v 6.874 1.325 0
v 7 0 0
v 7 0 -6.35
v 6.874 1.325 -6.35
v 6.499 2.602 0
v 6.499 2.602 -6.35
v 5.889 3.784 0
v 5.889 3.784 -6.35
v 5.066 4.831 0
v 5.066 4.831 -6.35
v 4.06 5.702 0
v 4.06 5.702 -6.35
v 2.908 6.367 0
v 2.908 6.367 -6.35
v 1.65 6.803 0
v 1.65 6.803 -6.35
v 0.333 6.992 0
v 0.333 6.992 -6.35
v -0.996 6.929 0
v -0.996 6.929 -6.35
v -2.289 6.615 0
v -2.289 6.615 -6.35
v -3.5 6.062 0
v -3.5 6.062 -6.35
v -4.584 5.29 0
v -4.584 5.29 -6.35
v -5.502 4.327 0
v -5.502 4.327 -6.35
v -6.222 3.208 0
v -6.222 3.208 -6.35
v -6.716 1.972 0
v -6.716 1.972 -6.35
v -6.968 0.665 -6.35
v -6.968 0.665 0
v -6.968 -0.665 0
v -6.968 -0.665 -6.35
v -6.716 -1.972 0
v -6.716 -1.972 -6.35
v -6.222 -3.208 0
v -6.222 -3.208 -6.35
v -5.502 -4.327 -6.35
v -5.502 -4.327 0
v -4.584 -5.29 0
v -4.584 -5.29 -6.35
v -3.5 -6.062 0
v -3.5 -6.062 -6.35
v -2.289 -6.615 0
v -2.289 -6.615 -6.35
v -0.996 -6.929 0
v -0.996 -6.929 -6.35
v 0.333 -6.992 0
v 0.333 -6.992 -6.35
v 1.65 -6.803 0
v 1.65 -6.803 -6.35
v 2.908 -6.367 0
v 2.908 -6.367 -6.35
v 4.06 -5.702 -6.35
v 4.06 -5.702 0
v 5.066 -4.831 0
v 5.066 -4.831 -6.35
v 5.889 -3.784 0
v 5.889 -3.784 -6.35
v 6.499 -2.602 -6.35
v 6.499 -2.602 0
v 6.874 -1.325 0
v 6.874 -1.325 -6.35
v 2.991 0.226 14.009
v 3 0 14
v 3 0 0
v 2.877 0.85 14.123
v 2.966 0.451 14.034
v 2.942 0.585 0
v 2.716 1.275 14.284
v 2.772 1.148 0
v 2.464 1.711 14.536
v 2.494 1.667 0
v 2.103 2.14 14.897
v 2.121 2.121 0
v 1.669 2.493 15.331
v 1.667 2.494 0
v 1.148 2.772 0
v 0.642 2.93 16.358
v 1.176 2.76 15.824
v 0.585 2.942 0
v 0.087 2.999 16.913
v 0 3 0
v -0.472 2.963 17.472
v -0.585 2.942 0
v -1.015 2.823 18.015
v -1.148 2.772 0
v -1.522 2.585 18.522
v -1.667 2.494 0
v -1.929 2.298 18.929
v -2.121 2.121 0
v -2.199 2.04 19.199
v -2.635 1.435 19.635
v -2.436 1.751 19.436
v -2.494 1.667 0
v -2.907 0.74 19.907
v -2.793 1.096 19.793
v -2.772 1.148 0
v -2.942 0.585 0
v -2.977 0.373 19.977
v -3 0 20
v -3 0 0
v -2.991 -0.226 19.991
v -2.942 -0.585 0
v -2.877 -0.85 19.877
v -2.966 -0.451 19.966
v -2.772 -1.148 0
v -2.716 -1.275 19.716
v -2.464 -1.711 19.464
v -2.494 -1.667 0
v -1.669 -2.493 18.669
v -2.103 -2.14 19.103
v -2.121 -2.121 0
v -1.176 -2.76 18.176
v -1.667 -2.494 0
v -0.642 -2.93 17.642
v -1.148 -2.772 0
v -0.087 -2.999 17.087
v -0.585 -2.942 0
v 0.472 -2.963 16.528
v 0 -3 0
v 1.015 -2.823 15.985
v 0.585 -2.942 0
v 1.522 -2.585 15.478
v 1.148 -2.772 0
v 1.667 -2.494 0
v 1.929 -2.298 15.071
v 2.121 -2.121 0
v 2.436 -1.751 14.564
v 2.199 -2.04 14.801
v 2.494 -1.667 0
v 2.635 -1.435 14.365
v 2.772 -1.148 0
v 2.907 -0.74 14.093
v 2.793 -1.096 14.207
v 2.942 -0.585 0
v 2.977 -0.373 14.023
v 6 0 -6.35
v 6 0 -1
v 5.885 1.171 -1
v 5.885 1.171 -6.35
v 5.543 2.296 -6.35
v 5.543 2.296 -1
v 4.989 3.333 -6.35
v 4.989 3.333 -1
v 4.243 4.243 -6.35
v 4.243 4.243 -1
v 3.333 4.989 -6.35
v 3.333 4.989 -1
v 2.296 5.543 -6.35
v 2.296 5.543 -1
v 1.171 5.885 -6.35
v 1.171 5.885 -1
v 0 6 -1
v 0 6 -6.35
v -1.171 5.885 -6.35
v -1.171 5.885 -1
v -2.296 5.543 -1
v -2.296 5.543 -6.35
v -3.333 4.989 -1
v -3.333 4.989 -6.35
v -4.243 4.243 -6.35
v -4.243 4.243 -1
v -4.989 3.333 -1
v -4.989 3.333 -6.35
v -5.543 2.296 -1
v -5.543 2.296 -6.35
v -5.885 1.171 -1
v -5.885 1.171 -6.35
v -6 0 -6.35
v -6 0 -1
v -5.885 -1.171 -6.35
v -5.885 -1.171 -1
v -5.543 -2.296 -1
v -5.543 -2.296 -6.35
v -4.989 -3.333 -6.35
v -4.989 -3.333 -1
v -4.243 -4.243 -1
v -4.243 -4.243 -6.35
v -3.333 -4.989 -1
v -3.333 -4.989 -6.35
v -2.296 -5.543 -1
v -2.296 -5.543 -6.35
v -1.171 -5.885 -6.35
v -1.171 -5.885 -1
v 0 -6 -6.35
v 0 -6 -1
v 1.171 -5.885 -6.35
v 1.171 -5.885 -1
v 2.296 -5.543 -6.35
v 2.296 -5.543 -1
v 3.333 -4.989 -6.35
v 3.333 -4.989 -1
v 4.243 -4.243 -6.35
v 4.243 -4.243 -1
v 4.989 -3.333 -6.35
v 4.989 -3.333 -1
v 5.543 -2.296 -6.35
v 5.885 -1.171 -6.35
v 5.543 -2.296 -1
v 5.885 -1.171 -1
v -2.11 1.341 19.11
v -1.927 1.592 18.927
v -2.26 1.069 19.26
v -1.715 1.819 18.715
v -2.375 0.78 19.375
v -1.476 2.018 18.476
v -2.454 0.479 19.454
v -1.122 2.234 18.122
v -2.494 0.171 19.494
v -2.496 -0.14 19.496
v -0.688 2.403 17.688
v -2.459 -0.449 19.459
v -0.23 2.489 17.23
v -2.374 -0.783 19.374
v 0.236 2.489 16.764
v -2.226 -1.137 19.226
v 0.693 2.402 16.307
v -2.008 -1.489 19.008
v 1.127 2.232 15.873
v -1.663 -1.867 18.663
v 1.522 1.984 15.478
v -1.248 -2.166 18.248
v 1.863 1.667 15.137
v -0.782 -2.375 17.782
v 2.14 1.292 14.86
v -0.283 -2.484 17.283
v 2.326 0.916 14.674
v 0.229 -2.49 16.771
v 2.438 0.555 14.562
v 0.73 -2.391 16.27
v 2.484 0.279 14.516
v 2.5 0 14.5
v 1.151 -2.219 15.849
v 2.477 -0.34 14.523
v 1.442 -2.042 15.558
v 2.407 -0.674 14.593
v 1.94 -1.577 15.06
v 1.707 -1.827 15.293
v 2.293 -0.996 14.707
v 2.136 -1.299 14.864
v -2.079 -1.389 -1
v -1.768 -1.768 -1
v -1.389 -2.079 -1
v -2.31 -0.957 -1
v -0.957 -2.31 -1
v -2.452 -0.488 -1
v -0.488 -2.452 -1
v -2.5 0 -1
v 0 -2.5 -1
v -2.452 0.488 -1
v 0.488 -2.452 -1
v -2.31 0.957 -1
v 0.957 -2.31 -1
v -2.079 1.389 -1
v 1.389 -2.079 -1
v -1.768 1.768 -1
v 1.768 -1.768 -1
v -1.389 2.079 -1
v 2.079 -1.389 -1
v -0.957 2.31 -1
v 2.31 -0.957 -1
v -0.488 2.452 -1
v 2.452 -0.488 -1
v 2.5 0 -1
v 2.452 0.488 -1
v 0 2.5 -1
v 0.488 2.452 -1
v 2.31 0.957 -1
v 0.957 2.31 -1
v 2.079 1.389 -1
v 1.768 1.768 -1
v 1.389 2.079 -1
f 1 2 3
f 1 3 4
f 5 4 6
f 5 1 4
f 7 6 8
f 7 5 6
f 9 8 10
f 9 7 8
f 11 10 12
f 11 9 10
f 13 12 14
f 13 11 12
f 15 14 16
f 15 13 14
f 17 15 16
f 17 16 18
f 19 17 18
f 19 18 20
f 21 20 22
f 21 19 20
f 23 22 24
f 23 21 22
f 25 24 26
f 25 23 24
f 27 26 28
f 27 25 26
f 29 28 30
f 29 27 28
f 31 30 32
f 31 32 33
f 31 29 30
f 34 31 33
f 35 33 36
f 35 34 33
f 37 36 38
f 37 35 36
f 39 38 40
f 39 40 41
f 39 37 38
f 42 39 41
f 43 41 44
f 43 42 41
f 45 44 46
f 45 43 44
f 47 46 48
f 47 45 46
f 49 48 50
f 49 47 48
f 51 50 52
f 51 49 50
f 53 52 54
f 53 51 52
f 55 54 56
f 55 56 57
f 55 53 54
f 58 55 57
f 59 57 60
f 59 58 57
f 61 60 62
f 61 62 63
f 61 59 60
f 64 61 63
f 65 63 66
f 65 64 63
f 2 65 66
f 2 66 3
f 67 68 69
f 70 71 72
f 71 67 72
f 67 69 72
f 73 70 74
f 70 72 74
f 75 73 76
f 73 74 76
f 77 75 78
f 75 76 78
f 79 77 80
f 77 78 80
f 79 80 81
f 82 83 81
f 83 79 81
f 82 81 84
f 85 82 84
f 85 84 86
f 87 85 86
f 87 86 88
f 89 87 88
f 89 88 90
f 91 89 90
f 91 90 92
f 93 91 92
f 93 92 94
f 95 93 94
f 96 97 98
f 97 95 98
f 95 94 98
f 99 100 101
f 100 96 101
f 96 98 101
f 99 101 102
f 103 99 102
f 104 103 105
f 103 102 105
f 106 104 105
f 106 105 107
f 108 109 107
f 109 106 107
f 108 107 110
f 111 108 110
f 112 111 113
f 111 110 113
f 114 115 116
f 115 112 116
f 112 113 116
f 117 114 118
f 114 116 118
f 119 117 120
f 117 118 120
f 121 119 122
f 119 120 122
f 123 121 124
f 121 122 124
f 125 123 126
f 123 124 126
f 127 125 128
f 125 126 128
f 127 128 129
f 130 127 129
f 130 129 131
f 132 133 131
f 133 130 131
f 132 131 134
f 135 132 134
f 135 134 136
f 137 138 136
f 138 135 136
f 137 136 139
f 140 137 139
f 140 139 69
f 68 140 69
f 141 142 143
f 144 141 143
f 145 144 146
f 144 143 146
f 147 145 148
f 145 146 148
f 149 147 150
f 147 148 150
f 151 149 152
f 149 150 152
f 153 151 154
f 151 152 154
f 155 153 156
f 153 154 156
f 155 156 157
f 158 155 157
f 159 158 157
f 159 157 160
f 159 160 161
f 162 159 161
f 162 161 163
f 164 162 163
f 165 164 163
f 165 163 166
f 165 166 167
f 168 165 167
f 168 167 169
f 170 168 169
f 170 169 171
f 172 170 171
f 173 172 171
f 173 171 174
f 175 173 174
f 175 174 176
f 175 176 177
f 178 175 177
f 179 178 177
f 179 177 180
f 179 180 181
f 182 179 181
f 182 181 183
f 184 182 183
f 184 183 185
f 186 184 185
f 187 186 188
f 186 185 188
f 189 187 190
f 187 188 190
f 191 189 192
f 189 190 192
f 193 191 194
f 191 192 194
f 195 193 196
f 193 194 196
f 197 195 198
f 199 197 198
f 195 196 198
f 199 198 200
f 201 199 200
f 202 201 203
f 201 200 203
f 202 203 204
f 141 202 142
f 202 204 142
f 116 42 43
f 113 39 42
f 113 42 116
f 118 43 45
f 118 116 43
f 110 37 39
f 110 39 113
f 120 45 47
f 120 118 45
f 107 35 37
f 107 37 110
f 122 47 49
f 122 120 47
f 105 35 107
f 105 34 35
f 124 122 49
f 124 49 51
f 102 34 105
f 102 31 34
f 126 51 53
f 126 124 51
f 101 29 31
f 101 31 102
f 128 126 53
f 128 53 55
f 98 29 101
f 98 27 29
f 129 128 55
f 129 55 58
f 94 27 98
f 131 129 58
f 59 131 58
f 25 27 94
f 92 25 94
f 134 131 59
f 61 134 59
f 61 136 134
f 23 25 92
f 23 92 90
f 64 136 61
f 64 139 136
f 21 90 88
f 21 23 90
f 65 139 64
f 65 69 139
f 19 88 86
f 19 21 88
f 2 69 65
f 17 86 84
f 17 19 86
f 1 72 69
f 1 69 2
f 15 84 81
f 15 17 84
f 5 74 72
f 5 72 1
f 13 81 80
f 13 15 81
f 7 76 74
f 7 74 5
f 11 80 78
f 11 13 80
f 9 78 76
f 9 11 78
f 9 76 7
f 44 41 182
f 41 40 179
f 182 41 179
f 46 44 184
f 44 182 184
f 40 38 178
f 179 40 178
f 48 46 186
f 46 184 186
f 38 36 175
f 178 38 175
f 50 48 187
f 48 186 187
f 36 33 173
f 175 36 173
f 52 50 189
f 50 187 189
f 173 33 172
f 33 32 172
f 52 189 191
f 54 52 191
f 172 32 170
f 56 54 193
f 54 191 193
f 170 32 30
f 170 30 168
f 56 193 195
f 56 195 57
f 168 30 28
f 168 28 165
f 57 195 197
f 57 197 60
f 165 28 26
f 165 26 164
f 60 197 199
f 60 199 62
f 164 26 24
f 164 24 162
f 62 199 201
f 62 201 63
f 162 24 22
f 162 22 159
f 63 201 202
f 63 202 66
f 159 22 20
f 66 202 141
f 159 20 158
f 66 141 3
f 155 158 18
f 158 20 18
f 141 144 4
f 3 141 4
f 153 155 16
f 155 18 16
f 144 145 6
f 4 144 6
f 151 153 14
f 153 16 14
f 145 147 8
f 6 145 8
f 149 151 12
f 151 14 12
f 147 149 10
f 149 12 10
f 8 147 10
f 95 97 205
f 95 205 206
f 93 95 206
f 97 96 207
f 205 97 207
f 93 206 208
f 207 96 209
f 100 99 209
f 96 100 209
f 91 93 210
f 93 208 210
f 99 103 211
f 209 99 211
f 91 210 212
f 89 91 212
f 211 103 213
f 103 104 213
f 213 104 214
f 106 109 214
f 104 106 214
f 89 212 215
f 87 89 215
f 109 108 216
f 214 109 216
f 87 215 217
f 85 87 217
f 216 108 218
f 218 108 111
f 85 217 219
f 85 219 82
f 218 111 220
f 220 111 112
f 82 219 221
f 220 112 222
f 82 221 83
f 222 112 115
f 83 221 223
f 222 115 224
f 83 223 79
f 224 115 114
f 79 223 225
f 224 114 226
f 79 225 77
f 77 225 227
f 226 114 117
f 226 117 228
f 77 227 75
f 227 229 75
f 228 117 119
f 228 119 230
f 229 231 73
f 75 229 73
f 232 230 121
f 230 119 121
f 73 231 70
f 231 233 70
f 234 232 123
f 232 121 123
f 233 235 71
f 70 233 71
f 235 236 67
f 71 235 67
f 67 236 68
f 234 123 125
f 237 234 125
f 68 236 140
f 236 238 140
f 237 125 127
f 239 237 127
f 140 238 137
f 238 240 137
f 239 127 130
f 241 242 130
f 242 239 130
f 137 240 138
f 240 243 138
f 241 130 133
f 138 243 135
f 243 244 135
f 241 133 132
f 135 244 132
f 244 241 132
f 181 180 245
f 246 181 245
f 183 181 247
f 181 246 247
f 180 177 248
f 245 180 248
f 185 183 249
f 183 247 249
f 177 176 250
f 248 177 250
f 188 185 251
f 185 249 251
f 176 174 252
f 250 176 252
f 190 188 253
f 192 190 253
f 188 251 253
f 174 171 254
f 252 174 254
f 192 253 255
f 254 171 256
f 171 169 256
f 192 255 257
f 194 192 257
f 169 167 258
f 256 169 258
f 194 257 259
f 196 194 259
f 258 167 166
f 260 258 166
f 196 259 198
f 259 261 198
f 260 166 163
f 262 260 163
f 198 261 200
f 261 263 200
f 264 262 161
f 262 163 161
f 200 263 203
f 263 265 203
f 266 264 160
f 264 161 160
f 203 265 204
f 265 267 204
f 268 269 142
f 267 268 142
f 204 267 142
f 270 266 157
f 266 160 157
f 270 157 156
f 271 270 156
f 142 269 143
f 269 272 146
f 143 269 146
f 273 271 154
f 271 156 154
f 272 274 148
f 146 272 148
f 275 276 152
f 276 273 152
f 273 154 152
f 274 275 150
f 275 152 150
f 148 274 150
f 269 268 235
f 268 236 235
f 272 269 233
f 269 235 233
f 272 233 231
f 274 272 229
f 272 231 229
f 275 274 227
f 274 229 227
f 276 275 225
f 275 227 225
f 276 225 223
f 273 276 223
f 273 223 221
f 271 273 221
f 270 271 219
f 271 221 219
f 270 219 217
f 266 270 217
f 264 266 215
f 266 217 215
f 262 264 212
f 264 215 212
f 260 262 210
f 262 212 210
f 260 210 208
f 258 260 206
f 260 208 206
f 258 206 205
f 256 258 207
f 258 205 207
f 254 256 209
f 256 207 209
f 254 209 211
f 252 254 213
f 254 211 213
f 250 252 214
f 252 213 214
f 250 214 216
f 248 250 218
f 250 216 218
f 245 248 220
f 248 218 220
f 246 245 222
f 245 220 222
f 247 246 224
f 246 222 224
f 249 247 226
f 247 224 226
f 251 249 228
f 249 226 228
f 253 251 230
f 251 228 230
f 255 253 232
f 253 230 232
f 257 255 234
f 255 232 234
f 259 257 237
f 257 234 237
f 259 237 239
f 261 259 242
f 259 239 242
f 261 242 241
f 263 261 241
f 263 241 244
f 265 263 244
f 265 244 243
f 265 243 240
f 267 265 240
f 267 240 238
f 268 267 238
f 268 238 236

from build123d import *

# Parameters (mm, degrees)
F0_R     = 3
F0_R_2   = 2.5
F1_DEPTH = 20
F2_R     = 7
F2_R_2   = 6
F3_DEPTH = 6.35
F4_R     = 6
F4_R_2   = 2.5
F5_DEPTH = 1
F7_DEPTH = 12.7


with BuildPart() as f1:
    # F0 (on Top) → F1 (new body)
    with BuildSketch(Plane.XY):
        Circle(F0_R)
        Circle(F0_R_2, mode=Mode.SUBTRACT)
    extrude(amount=F1_DEPTH)



with BuildPart() as f3:
    # F2 (on Top) → F3 (new body)
    with BuildSketch(Plane.XY):
        Circle(F2_R)
        Circle(F2_R_2, mode=Mode.SUBTRACT)
    extrude(amount=-F3_DEPTH)


with BuildPart() as f1_1:
    add(f1.part)

    add(f3.part)  # F5 merges F3
    # F4 (on Top) → F5 (join)
    with BuildSketch(Plane.XY):
        Circle(F4_R)
        Circle(F4_R_2, mode=Mode.SUBTRACT)
    extrude(amount=-F5_DEPTH)

    # F6 (on Front) → F7 (cut, symmetric)
    with BuildSketch(Plane.XZ):
        Polygon((3, 20), (-3, 20), (3, 14), align=None)
    extrude(amount=F7_DEPTH, both=True, mode=Mode.SUBTRACT)


solid = f1_1.part
